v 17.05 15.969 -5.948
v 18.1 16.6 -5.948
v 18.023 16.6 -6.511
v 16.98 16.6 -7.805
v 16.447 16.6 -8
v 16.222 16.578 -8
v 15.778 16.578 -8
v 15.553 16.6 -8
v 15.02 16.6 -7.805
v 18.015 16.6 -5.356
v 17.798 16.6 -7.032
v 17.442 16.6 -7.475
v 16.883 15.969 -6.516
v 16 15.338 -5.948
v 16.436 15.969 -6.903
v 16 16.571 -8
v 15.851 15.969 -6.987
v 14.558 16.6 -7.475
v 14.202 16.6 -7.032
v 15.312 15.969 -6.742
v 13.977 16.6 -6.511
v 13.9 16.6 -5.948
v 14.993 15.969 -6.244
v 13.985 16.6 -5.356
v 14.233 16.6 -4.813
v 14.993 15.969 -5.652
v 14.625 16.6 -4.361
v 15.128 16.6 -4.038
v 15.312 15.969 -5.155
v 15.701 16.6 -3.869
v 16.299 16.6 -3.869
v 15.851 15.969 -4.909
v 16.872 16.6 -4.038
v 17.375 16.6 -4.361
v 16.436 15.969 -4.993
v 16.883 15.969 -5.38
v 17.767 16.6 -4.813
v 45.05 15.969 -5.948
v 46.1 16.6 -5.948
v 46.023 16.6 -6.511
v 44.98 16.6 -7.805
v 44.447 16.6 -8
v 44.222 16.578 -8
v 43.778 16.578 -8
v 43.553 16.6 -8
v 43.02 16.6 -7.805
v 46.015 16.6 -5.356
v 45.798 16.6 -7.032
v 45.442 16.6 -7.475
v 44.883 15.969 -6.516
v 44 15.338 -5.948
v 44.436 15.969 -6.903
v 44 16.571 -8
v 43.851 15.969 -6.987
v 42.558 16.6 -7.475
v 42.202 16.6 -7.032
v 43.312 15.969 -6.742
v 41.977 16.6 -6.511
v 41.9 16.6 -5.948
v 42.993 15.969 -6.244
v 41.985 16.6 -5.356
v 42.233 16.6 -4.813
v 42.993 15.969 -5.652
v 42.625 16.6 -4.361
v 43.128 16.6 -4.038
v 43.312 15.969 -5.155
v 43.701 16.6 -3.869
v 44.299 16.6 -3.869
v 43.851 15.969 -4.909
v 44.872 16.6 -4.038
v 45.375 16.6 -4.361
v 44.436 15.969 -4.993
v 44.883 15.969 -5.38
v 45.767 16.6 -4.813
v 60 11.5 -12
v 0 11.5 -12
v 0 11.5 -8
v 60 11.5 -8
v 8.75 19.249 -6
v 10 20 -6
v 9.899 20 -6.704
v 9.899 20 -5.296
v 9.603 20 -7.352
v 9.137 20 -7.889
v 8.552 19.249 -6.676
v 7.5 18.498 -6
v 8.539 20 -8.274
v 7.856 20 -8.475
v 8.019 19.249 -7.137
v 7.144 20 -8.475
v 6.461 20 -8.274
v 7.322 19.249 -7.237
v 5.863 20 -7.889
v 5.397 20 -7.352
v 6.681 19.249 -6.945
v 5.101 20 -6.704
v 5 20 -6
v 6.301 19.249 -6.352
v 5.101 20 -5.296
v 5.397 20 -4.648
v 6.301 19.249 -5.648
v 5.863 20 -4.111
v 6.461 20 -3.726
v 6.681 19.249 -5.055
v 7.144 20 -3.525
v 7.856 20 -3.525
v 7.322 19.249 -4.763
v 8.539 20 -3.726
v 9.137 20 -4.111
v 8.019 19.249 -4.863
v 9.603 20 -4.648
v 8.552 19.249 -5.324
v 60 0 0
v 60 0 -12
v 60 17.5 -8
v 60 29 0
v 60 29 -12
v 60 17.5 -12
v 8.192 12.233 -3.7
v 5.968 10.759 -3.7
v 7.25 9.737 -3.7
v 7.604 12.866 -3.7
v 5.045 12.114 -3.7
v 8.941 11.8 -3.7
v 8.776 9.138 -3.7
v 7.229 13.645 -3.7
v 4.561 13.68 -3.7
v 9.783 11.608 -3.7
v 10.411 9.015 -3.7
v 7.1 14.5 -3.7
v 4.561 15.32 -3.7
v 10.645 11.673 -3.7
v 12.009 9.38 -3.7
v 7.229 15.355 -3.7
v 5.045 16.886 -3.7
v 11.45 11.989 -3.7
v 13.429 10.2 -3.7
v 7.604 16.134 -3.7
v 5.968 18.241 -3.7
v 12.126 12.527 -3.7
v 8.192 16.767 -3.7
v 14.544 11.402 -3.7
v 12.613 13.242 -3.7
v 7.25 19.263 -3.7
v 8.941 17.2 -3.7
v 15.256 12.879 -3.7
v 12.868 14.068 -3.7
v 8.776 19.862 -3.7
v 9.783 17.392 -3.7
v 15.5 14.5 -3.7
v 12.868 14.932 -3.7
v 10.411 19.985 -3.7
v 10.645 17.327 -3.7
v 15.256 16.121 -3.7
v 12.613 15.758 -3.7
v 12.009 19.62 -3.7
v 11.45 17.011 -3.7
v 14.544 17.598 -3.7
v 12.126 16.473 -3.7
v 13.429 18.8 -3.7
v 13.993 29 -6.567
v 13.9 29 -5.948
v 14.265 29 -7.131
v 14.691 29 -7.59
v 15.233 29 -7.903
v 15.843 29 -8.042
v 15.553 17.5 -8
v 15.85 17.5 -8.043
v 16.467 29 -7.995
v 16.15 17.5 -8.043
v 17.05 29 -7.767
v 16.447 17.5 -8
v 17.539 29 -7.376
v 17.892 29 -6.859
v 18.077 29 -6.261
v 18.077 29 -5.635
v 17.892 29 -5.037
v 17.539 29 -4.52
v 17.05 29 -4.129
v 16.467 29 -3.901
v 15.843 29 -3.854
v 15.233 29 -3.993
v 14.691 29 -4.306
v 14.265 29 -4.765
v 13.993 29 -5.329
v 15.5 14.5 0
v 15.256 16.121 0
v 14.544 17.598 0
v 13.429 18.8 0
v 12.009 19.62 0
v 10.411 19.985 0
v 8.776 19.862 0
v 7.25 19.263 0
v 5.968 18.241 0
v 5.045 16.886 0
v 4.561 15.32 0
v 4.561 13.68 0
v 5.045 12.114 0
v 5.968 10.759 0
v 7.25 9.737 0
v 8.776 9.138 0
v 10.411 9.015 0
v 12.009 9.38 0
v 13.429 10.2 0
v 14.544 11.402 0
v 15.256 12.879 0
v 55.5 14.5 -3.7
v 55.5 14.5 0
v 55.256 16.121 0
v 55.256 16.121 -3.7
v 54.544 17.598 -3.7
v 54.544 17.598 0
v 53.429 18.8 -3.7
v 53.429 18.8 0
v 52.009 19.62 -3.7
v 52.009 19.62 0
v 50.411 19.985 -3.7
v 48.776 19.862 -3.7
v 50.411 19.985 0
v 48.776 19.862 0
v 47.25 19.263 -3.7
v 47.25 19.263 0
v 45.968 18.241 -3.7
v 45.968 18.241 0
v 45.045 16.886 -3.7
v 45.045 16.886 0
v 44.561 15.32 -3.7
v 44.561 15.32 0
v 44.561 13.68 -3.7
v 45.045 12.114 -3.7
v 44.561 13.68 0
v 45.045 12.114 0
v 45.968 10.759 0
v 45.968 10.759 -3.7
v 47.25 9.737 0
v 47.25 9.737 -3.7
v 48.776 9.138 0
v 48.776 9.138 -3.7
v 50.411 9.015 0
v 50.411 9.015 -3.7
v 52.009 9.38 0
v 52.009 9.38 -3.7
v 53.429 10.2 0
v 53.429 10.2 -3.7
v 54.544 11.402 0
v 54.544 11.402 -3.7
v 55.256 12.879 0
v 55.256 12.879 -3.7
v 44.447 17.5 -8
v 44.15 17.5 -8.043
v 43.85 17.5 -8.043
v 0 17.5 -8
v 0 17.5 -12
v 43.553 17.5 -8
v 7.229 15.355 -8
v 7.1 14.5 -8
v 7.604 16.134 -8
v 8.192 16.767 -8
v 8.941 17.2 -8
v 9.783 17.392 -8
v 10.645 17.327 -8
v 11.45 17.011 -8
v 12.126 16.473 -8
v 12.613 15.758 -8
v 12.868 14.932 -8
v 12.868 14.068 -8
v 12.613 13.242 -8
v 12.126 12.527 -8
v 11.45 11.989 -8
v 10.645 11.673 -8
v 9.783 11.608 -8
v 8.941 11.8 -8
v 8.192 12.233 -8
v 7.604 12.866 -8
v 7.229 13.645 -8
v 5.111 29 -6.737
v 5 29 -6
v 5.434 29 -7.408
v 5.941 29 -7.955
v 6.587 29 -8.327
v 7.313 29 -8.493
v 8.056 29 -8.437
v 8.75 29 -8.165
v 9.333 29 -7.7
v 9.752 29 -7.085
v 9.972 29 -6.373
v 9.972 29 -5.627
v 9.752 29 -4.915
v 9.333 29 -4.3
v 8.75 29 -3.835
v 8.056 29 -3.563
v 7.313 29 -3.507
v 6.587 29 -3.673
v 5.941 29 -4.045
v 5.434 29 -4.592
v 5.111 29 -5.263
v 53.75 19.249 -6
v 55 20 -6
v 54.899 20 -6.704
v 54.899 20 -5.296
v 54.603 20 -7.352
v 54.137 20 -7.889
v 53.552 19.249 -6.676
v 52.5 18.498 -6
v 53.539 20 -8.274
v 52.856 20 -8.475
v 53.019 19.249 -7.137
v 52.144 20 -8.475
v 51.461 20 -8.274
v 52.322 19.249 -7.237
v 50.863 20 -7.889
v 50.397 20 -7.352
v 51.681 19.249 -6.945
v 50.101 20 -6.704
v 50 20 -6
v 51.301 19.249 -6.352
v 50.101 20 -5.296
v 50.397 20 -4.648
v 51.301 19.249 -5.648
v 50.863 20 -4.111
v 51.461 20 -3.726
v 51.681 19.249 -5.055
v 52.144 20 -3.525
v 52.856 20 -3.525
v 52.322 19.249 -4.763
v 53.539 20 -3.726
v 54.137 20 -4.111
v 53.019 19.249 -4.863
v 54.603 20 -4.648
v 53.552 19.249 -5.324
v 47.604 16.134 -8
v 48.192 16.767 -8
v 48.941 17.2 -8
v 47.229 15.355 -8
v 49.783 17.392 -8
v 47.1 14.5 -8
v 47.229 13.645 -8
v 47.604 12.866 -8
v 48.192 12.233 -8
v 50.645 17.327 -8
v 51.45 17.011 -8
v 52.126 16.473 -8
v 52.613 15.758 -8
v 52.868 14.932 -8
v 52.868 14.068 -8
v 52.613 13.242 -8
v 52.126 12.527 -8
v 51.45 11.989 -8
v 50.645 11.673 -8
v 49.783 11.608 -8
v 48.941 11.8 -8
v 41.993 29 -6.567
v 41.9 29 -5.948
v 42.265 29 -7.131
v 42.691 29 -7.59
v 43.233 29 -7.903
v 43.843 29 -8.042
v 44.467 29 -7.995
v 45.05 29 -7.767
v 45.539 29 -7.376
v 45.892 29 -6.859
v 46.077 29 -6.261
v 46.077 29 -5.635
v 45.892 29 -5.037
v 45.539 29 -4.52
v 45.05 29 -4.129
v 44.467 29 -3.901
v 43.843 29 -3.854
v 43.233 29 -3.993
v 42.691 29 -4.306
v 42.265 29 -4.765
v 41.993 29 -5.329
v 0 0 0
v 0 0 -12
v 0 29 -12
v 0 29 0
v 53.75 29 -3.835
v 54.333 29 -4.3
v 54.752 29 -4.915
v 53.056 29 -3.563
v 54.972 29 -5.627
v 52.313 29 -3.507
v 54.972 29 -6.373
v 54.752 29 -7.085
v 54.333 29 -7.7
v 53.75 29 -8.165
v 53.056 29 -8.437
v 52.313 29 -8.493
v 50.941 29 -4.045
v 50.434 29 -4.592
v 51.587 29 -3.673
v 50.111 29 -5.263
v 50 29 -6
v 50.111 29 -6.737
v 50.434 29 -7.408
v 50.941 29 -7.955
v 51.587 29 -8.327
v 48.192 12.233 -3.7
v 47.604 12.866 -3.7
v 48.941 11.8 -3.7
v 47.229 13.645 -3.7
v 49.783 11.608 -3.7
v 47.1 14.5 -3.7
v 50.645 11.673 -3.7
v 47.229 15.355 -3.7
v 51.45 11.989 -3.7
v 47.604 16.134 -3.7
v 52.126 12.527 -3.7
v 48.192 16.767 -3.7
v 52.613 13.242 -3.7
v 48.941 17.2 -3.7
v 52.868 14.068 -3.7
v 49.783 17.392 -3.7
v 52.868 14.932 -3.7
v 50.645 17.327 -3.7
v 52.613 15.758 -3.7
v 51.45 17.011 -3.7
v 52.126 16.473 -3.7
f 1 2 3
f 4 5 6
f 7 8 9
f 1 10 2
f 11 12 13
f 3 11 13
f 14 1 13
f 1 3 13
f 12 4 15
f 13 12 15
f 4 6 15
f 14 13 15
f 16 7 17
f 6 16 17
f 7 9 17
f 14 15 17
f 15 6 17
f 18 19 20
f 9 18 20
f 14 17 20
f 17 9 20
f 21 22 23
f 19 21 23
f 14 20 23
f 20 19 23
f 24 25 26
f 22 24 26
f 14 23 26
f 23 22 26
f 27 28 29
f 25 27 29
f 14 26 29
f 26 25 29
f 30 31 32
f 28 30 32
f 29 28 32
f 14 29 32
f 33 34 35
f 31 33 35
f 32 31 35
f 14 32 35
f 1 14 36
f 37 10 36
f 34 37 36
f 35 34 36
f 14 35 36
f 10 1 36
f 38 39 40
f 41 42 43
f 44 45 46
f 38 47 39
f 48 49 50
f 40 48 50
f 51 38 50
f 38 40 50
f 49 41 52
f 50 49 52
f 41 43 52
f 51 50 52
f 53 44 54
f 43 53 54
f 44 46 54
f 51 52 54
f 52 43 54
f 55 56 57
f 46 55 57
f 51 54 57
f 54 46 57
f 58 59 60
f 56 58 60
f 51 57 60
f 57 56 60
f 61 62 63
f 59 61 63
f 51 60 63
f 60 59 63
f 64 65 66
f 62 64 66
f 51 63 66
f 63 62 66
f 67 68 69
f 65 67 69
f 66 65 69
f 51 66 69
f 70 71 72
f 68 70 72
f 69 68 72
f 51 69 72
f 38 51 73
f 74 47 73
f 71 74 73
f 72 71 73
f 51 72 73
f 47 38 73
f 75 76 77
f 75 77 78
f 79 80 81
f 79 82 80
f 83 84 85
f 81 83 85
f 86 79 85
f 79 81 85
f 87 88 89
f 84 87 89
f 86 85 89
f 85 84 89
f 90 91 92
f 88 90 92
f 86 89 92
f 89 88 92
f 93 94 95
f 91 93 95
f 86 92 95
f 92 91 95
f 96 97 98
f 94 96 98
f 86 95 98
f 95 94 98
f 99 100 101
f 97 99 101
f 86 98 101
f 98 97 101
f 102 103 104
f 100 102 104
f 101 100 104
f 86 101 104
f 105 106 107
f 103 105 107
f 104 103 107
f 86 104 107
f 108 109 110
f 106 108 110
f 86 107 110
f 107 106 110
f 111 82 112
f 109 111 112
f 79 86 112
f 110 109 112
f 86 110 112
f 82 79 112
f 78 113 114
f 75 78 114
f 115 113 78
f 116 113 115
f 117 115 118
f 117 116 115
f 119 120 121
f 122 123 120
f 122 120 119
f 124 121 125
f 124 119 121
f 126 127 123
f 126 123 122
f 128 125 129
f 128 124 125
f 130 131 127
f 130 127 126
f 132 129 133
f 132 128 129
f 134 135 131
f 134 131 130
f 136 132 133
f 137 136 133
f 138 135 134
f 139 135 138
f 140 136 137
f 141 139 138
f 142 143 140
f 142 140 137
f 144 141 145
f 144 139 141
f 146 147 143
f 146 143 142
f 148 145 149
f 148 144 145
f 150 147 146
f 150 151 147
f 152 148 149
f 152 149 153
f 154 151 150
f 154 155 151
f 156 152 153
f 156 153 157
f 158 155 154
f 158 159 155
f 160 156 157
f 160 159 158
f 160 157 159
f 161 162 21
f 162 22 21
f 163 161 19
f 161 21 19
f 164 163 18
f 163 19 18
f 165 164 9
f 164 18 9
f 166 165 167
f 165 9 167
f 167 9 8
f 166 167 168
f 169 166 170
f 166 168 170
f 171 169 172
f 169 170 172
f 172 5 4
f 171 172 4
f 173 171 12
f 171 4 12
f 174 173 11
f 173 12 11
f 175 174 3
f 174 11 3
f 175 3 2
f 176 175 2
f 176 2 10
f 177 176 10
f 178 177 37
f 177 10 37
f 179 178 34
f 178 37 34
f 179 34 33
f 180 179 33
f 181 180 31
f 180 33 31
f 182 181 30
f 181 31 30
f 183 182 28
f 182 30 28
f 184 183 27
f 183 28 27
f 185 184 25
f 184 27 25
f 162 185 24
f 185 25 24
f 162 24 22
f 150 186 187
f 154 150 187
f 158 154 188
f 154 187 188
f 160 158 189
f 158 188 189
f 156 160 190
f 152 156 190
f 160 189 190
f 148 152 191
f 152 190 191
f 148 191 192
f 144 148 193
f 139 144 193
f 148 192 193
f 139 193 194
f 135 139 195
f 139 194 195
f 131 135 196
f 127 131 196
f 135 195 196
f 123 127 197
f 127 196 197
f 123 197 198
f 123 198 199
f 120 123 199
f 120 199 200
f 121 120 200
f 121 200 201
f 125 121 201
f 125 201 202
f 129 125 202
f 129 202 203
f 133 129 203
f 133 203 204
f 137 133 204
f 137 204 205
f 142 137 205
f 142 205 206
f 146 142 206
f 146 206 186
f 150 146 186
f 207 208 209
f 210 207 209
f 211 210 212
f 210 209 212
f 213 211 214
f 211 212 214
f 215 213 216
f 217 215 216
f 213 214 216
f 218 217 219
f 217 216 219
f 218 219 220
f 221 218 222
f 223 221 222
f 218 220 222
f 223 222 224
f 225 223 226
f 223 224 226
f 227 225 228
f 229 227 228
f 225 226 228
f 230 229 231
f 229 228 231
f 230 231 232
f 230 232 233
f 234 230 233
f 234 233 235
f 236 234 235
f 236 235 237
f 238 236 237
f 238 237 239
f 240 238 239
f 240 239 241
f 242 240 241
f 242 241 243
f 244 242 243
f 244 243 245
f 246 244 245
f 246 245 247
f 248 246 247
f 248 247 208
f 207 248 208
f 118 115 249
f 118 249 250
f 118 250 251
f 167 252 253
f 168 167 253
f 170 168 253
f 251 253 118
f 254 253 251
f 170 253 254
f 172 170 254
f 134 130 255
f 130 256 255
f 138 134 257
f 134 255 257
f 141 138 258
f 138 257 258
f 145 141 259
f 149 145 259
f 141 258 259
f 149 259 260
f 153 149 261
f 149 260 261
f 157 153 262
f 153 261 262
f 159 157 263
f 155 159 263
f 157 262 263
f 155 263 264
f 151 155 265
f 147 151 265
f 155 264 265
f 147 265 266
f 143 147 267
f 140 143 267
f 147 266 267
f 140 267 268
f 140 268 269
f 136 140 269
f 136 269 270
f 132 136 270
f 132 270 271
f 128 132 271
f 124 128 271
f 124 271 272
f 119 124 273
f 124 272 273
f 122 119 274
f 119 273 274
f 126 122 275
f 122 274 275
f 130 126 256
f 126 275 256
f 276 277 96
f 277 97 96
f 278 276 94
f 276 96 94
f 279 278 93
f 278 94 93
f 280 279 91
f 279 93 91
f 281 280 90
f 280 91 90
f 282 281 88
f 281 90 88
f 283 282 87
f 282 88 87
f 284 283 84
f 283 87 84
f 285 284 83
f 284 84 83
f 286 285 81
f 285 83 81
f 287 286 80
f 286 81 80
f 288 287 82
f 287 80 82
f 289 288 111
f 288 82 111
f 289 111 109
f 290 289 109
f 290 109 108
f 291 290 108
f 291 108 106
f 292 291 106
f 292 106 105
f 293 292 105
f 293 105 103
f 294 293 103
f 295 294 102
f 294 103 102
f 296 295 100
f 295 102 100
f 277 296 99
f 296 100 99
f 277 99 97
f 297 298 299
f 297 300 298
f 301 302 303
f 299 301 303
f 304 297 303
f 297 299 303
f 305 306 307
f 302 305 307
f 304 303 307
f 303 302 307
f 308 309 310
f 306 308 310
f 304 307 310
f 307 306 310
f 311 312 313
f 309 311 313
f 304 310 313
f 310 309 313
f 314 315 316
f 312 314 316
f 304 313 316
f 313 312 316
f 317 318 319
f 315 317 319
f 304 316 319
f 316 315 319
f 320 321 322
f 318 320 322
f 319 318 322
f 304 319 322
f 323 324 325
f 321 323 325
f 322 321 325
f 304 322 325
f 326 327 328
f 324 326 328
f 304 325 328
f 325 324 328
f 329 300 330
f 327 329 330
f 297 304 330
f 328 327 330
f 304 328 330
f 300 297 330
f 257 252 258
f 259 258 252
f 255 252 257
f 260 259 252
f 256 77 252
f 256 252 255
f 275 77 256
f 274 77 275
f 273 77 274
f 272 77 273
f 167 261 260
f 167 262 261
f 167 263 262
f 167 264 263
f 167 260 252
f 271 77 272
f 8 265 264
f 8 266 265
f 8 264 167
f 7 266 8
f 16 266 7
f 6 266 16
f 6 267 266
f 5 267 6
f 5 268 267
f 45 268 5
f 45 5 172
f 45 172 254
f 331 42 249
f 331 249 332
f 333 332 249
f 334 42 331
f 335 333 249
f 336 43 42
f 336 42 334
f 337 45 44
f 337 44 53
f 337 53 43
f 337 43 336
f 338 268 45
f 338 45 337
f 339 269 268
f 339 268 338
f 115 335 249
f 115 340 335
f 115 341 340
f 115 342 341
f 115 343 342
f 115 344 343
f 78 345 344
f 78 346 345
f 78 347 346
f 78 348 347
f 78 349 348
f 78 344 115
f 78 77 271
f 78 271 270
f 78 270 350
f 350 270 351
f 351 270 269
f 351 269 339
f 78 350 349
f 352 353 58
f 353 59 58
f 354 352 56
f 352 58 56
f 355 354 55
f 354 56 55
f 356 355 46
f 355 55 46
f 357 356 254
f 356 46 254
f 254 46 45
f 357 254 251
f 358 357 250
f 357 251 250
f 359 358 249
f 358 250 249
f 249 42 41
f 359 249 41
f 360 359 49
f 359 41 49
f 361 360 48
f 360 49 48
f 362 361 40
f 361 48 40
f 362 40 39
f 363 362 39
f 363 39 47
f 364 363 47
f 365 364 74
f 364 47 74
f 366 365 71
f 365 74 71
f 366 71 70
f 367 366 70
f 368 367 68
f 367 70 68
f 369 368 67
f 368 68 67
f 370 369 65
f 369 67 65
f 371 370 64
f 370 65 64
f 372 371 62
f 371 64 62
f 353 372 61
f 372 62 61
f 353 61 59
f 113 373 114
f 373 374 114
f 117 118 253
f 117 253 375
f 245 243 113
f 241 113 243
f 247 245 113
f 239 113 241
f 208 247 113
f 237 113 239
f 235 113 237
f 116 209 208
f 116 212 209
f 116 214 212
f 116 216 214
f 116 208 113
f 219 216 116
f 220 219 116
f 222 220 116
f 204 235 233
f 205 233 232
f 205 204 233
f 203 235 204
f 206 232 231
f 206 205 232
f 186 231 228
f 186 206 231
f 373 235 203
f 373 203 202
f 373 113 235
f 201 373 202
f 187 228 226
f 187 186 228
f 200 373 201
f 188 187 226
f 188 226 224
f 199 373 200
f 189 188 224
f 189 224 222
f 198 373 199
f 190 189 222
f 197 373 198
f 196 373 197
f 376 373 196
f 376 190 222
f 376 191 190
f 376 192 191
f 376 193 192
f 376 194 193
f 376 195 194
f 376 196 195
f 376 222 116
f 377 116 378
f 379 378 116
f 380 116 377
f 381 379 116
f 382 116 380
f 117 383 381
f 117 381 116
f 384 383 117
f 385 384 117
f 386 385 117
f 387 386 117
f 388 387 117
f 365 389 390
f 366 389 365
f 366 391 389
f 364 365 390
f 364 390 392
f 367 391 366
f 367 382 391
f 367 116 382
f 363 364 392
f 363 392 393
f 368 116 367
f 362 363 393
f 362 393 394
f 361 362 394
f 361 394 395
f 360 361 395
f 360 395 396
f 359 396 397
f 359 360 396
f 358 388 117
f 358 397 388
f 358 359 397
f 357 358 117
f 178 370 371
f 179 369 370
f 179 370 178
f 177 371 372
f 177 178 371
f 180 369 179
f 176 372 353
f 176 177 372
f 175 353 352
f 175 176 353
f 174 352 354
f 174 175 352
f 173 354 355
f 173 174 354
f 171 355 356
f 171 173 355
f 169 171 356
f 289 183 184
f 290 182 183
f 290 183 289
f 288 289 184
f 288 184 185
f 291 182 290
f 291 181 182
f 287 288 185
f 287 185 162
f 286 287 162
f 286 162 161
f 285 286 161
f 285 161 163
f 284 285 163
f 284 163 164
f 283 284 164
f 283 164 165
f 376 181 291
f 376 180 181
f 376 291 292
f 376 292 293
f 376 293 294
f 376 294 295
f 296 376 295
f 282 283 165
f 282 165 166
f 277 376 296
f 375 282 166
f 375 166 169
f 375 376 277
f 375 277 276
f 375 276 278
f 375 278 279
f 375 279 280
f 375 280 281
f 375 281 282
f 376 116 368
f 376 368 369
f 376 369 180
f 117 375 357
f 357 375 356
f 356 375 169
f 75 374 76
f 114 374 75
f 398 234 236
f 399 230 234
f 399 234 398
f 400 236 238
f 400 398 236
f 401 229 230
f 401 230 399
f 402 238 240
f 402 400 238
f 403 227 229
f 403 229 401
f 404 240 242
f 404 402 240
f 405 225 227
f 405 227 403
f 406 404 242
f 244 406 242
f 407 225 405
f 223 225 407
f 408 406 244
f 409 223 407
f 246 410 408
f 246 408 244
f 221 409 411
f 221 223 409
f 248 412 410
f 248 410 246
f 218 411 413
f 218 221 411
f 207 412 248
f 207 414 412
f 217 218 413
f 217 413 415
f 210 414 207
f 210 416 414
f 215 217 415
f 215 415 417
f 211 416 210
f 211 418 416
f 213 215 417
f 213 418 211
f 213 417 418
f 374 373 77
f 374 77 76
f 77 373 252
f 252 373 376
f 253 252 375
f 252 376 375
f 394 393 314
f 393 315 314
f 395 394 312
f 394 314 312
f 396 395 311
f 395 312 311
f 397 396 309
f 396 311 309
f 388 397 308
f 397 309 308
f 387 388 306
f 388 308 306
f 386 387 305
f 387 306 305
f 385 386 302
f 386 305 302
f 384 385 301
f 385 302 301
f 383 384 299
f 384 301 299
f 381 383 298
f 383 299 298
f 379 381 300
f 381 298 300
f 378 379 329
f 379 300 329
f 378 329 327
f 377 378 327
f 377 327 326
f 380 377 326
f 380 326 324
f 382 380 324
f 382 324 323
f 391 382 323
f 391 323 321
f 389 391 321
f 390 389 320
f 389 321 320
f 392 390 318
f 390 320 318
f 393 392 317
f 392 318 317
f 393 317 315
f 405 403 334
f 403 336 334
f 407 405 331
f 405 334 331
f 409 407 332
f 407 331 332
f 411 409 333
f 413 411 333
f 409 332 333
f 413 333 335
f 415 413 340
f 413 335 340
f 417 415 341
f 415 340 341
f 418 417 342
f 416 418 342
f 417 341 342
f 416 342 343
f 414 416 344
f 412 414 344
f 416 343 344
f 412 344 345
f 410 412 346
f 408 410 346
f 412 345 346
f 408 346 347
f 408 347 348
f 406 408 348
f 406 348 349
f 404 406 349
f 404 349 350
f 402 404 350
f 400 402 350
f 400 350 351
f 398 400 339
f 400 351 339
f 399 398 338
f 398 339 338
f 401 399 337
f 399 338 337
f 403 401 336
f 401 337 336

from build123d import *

# Parameters (mm, degrees)
SKETCH1_W                                = 60
SKETCH1_H                                = 12
BOSS_EXTRUDE1_DEPTH                      = 11.5
SKETCH4_W                                = 60
SKETCH4_H                                = 8
BOSS_EXTRUDE2_DEPTH                      = 17.5
SKETCH9_W                                = 12
SKETCH9_H                                = 11.5
BOSS_EXTRUDE3_DEPTH                      = 60
CBORE_FOR_M5_PAN_HEAD_SCREW2_D           = 5.8
CBORE_FOR_M5_PAN_HEAD_SCREW2_DEPTH       = 8.2
CBORE_FOR_M5_PAN_HEAD_SCREW2_CBORE_D     = 11
CBORE_FOR_M5_PAN_HEAD_SCREW2_CBORE_DEPTH = 3.7
CBORE_FOR_M5_PAN_HEAD_SCREW2_TIP         = 1.742495795
F_5_0MM_DOWEL_HOLE7_D                    = 5
F_5_0MM_DOWEL_HOLE7_DEPTH                = 9
F_5_0MM_DOWEL_HOLE7_TIP                  = 1.502151548
F_5_0MM_DOWEL_HOLE8_D                    = 5
F_5_0MM_DOWEL_HOLE8_DEPTH                = 9
F_5_0MM_DOWEL_HOLE8_TIP                  = 1.502151548
M5_TAPPED_HOLE2_D                        = 4.2
M5_TAPPED_HOLE2_DEPTH                    = 12.4
M5_TAPPED_HOLE2_TIP                      = 1.2618073
M5_TAPPED_HOLE3_D                        = 4.2
M5_TAPPED_HOLE3_DEPTH                    = 12.4
M5_TAPPED_HOLE3_TIP                      = 1.2618073


with BuildPart() as part:
    # Sketch1 → Boss-Extrude1 (new body)
    with BuildSketch(Plane(origin=(0, 0, 0), x_dir=(1, 0, 0), z_dir=(0, 1, 0))):
        with Locations((30, 6)):
            Rectangle(SKETCH1_W, SKETCH1_H)
    extrude(amount=BOSS_EXTRUDE1_DEPTH)

    # Sketch4 → Boss-Extrude2 (add)
    with BuildSketch(Plane(origin=(0, 0, 0), x_dir=(1, 0, 0), z_dir=(0, 1, 0))):
        with Locations((30, 4)):
            Rectangle(SKETCH4_W, SKETCH4_H)
    extrude(amount=BOSS_EXTRUDE2_DEPTH)

    # Sketch9 → Boss-Extrude3 (add)
    with BuildSketch(Plane(origin=(0, 0, 0), x_dir=(0, 0, -1), z_dir=(1, 0, 0))):
        with Locations((6, 23.25)):
            Rectangle(SKETCH9_W, SKETCH9_H)
    extrude(amount=BOSS_EXTRUDE3_DEPTH)

    # CBORE for M5 Pan Head Screw2
    with Locations(Plane.XY):
        with Locations((50, 14.5), (10, 14.5)):
            CounterBoreHole(CBORE_FOR_M5_PAN_HEAD_SCREW2_D / 2, CBORE_FOR_M5_PAN_HEAD_SCREW2_CBORE_D / 2, CBORE_FOR_M5_PAN_HEAD_SCREW2_CBORE_DEPTH, depth=CBORE_FOR_M5_PAN_HEAD_SCREW2_DEPTH)
            with Locations((0, 0, -(CBORE_FOR_M5_PAN_HEAD_SCREW2_DEPTH + CBORE_FOR_M5_PAN_HEAD_SCREW2_TIP / 2))):  # 118° drill point
                Cone(0, CBORE_FOR_M5_PAN_HEAD_SCREW2_D / 2, CBORE_FOR_M5_PAN_HEAD_SCREW2_TIP, mode=Mode.SUBTRACT)

    # Ø5.0mm Dowel Hole7
    with Locations(Plane(origin=(0, 29, 0), x_dir=(1, 0, 0), z_dir=(0, 1, 0))):
        with Locations((7.5, 6)):
            Hole(F_5_0MM_DOWEL_HOLE7_D / 2, depth=F_5_0MM_DOWEL_HOLE7_DEPTH)
            with Locations((0, 0, -(F_5_0MM_DOWEL_HOLE7_DEPTH + F_5_0MM_DOWEL_HOLE7_TIP / 2))):  # 118° drill point
                Cone(0, F_5_0MM_DOWEL_HOLE7_D / 2, F_5_0MM_DOWEL_HOLE7_TIP, mode=Mode.SUBTRACT)

    # Ø5.0mm Dowel Hole8
    with Locations(Plane(origin=(0, 29, 0), x_dir=(1, 0, 0), z_dir=(0, 1, 0))):
        with Locations((52.5, 6)):
            Hole(F_5_0MM_DOWEL_HOLE8_D / 2, depth=F_5_0MM_DOWEL_HOLE8_DEPTH)
            with Locations((0, 0, -(F_5_0MM_DOWEL_HOLE8_DEPTH + F_5_0MM_DOWEL_HOLE8_TIP / 2))):  # 118° drill point
                Cone(0, F_5_0MM_DOWEL_HOLE8_D / 2, F_5_0MM_DOWEL_HOLE8_TIP, mode=Mode.SUBTRACT)

    # M5 Tapped Hole2
    with Locations(Plane(origin=(0, 29, 0), x_dir=(1, 0, 0), z_dir=(0, 1, 0))):
        with Locations((16, 5.948108633)):
            Hole(M5_TAPPED_HOLE2_D / 2, depth=M5_TAPPED_HOLE2_DEPTH)
            with Locations((0, 0, -(M5_TAPPED_HOLE2_DEPTH + M5_TAPPED_HOLE2_TIP / 2))):  # 118° drill point
                Cone(0, M5_TAPPED_HOLE2_D / 2, M5_TAPPED_HOLE2_TIP, mode=Mode.SUBTRACT)

    # M5 Tapped Hole3
    with Locations(Plane(origin=(0, 29, 0), x_dir=(1, 0, 0), z_dir=(0, 1, 0))):
        with Locations((44, 5.948108633)):
            Hole(M5_TAPPED_HOLE3_D / 2, depth=M5_TAPPED_HOLE3_DEPTH)
            with Locations((0, 0, -(M5_TAPPED_HOLE3_DEPTH + M5_TAPPED_HOLE3_TIP / 2))):  # 118° drill point
                Cone(0, M5_TAPPED_HOLE3_D / 2, M5_TAPPED_HOLE3_TIP, mode=Mode.SUBTRACT)


solid = part.part
